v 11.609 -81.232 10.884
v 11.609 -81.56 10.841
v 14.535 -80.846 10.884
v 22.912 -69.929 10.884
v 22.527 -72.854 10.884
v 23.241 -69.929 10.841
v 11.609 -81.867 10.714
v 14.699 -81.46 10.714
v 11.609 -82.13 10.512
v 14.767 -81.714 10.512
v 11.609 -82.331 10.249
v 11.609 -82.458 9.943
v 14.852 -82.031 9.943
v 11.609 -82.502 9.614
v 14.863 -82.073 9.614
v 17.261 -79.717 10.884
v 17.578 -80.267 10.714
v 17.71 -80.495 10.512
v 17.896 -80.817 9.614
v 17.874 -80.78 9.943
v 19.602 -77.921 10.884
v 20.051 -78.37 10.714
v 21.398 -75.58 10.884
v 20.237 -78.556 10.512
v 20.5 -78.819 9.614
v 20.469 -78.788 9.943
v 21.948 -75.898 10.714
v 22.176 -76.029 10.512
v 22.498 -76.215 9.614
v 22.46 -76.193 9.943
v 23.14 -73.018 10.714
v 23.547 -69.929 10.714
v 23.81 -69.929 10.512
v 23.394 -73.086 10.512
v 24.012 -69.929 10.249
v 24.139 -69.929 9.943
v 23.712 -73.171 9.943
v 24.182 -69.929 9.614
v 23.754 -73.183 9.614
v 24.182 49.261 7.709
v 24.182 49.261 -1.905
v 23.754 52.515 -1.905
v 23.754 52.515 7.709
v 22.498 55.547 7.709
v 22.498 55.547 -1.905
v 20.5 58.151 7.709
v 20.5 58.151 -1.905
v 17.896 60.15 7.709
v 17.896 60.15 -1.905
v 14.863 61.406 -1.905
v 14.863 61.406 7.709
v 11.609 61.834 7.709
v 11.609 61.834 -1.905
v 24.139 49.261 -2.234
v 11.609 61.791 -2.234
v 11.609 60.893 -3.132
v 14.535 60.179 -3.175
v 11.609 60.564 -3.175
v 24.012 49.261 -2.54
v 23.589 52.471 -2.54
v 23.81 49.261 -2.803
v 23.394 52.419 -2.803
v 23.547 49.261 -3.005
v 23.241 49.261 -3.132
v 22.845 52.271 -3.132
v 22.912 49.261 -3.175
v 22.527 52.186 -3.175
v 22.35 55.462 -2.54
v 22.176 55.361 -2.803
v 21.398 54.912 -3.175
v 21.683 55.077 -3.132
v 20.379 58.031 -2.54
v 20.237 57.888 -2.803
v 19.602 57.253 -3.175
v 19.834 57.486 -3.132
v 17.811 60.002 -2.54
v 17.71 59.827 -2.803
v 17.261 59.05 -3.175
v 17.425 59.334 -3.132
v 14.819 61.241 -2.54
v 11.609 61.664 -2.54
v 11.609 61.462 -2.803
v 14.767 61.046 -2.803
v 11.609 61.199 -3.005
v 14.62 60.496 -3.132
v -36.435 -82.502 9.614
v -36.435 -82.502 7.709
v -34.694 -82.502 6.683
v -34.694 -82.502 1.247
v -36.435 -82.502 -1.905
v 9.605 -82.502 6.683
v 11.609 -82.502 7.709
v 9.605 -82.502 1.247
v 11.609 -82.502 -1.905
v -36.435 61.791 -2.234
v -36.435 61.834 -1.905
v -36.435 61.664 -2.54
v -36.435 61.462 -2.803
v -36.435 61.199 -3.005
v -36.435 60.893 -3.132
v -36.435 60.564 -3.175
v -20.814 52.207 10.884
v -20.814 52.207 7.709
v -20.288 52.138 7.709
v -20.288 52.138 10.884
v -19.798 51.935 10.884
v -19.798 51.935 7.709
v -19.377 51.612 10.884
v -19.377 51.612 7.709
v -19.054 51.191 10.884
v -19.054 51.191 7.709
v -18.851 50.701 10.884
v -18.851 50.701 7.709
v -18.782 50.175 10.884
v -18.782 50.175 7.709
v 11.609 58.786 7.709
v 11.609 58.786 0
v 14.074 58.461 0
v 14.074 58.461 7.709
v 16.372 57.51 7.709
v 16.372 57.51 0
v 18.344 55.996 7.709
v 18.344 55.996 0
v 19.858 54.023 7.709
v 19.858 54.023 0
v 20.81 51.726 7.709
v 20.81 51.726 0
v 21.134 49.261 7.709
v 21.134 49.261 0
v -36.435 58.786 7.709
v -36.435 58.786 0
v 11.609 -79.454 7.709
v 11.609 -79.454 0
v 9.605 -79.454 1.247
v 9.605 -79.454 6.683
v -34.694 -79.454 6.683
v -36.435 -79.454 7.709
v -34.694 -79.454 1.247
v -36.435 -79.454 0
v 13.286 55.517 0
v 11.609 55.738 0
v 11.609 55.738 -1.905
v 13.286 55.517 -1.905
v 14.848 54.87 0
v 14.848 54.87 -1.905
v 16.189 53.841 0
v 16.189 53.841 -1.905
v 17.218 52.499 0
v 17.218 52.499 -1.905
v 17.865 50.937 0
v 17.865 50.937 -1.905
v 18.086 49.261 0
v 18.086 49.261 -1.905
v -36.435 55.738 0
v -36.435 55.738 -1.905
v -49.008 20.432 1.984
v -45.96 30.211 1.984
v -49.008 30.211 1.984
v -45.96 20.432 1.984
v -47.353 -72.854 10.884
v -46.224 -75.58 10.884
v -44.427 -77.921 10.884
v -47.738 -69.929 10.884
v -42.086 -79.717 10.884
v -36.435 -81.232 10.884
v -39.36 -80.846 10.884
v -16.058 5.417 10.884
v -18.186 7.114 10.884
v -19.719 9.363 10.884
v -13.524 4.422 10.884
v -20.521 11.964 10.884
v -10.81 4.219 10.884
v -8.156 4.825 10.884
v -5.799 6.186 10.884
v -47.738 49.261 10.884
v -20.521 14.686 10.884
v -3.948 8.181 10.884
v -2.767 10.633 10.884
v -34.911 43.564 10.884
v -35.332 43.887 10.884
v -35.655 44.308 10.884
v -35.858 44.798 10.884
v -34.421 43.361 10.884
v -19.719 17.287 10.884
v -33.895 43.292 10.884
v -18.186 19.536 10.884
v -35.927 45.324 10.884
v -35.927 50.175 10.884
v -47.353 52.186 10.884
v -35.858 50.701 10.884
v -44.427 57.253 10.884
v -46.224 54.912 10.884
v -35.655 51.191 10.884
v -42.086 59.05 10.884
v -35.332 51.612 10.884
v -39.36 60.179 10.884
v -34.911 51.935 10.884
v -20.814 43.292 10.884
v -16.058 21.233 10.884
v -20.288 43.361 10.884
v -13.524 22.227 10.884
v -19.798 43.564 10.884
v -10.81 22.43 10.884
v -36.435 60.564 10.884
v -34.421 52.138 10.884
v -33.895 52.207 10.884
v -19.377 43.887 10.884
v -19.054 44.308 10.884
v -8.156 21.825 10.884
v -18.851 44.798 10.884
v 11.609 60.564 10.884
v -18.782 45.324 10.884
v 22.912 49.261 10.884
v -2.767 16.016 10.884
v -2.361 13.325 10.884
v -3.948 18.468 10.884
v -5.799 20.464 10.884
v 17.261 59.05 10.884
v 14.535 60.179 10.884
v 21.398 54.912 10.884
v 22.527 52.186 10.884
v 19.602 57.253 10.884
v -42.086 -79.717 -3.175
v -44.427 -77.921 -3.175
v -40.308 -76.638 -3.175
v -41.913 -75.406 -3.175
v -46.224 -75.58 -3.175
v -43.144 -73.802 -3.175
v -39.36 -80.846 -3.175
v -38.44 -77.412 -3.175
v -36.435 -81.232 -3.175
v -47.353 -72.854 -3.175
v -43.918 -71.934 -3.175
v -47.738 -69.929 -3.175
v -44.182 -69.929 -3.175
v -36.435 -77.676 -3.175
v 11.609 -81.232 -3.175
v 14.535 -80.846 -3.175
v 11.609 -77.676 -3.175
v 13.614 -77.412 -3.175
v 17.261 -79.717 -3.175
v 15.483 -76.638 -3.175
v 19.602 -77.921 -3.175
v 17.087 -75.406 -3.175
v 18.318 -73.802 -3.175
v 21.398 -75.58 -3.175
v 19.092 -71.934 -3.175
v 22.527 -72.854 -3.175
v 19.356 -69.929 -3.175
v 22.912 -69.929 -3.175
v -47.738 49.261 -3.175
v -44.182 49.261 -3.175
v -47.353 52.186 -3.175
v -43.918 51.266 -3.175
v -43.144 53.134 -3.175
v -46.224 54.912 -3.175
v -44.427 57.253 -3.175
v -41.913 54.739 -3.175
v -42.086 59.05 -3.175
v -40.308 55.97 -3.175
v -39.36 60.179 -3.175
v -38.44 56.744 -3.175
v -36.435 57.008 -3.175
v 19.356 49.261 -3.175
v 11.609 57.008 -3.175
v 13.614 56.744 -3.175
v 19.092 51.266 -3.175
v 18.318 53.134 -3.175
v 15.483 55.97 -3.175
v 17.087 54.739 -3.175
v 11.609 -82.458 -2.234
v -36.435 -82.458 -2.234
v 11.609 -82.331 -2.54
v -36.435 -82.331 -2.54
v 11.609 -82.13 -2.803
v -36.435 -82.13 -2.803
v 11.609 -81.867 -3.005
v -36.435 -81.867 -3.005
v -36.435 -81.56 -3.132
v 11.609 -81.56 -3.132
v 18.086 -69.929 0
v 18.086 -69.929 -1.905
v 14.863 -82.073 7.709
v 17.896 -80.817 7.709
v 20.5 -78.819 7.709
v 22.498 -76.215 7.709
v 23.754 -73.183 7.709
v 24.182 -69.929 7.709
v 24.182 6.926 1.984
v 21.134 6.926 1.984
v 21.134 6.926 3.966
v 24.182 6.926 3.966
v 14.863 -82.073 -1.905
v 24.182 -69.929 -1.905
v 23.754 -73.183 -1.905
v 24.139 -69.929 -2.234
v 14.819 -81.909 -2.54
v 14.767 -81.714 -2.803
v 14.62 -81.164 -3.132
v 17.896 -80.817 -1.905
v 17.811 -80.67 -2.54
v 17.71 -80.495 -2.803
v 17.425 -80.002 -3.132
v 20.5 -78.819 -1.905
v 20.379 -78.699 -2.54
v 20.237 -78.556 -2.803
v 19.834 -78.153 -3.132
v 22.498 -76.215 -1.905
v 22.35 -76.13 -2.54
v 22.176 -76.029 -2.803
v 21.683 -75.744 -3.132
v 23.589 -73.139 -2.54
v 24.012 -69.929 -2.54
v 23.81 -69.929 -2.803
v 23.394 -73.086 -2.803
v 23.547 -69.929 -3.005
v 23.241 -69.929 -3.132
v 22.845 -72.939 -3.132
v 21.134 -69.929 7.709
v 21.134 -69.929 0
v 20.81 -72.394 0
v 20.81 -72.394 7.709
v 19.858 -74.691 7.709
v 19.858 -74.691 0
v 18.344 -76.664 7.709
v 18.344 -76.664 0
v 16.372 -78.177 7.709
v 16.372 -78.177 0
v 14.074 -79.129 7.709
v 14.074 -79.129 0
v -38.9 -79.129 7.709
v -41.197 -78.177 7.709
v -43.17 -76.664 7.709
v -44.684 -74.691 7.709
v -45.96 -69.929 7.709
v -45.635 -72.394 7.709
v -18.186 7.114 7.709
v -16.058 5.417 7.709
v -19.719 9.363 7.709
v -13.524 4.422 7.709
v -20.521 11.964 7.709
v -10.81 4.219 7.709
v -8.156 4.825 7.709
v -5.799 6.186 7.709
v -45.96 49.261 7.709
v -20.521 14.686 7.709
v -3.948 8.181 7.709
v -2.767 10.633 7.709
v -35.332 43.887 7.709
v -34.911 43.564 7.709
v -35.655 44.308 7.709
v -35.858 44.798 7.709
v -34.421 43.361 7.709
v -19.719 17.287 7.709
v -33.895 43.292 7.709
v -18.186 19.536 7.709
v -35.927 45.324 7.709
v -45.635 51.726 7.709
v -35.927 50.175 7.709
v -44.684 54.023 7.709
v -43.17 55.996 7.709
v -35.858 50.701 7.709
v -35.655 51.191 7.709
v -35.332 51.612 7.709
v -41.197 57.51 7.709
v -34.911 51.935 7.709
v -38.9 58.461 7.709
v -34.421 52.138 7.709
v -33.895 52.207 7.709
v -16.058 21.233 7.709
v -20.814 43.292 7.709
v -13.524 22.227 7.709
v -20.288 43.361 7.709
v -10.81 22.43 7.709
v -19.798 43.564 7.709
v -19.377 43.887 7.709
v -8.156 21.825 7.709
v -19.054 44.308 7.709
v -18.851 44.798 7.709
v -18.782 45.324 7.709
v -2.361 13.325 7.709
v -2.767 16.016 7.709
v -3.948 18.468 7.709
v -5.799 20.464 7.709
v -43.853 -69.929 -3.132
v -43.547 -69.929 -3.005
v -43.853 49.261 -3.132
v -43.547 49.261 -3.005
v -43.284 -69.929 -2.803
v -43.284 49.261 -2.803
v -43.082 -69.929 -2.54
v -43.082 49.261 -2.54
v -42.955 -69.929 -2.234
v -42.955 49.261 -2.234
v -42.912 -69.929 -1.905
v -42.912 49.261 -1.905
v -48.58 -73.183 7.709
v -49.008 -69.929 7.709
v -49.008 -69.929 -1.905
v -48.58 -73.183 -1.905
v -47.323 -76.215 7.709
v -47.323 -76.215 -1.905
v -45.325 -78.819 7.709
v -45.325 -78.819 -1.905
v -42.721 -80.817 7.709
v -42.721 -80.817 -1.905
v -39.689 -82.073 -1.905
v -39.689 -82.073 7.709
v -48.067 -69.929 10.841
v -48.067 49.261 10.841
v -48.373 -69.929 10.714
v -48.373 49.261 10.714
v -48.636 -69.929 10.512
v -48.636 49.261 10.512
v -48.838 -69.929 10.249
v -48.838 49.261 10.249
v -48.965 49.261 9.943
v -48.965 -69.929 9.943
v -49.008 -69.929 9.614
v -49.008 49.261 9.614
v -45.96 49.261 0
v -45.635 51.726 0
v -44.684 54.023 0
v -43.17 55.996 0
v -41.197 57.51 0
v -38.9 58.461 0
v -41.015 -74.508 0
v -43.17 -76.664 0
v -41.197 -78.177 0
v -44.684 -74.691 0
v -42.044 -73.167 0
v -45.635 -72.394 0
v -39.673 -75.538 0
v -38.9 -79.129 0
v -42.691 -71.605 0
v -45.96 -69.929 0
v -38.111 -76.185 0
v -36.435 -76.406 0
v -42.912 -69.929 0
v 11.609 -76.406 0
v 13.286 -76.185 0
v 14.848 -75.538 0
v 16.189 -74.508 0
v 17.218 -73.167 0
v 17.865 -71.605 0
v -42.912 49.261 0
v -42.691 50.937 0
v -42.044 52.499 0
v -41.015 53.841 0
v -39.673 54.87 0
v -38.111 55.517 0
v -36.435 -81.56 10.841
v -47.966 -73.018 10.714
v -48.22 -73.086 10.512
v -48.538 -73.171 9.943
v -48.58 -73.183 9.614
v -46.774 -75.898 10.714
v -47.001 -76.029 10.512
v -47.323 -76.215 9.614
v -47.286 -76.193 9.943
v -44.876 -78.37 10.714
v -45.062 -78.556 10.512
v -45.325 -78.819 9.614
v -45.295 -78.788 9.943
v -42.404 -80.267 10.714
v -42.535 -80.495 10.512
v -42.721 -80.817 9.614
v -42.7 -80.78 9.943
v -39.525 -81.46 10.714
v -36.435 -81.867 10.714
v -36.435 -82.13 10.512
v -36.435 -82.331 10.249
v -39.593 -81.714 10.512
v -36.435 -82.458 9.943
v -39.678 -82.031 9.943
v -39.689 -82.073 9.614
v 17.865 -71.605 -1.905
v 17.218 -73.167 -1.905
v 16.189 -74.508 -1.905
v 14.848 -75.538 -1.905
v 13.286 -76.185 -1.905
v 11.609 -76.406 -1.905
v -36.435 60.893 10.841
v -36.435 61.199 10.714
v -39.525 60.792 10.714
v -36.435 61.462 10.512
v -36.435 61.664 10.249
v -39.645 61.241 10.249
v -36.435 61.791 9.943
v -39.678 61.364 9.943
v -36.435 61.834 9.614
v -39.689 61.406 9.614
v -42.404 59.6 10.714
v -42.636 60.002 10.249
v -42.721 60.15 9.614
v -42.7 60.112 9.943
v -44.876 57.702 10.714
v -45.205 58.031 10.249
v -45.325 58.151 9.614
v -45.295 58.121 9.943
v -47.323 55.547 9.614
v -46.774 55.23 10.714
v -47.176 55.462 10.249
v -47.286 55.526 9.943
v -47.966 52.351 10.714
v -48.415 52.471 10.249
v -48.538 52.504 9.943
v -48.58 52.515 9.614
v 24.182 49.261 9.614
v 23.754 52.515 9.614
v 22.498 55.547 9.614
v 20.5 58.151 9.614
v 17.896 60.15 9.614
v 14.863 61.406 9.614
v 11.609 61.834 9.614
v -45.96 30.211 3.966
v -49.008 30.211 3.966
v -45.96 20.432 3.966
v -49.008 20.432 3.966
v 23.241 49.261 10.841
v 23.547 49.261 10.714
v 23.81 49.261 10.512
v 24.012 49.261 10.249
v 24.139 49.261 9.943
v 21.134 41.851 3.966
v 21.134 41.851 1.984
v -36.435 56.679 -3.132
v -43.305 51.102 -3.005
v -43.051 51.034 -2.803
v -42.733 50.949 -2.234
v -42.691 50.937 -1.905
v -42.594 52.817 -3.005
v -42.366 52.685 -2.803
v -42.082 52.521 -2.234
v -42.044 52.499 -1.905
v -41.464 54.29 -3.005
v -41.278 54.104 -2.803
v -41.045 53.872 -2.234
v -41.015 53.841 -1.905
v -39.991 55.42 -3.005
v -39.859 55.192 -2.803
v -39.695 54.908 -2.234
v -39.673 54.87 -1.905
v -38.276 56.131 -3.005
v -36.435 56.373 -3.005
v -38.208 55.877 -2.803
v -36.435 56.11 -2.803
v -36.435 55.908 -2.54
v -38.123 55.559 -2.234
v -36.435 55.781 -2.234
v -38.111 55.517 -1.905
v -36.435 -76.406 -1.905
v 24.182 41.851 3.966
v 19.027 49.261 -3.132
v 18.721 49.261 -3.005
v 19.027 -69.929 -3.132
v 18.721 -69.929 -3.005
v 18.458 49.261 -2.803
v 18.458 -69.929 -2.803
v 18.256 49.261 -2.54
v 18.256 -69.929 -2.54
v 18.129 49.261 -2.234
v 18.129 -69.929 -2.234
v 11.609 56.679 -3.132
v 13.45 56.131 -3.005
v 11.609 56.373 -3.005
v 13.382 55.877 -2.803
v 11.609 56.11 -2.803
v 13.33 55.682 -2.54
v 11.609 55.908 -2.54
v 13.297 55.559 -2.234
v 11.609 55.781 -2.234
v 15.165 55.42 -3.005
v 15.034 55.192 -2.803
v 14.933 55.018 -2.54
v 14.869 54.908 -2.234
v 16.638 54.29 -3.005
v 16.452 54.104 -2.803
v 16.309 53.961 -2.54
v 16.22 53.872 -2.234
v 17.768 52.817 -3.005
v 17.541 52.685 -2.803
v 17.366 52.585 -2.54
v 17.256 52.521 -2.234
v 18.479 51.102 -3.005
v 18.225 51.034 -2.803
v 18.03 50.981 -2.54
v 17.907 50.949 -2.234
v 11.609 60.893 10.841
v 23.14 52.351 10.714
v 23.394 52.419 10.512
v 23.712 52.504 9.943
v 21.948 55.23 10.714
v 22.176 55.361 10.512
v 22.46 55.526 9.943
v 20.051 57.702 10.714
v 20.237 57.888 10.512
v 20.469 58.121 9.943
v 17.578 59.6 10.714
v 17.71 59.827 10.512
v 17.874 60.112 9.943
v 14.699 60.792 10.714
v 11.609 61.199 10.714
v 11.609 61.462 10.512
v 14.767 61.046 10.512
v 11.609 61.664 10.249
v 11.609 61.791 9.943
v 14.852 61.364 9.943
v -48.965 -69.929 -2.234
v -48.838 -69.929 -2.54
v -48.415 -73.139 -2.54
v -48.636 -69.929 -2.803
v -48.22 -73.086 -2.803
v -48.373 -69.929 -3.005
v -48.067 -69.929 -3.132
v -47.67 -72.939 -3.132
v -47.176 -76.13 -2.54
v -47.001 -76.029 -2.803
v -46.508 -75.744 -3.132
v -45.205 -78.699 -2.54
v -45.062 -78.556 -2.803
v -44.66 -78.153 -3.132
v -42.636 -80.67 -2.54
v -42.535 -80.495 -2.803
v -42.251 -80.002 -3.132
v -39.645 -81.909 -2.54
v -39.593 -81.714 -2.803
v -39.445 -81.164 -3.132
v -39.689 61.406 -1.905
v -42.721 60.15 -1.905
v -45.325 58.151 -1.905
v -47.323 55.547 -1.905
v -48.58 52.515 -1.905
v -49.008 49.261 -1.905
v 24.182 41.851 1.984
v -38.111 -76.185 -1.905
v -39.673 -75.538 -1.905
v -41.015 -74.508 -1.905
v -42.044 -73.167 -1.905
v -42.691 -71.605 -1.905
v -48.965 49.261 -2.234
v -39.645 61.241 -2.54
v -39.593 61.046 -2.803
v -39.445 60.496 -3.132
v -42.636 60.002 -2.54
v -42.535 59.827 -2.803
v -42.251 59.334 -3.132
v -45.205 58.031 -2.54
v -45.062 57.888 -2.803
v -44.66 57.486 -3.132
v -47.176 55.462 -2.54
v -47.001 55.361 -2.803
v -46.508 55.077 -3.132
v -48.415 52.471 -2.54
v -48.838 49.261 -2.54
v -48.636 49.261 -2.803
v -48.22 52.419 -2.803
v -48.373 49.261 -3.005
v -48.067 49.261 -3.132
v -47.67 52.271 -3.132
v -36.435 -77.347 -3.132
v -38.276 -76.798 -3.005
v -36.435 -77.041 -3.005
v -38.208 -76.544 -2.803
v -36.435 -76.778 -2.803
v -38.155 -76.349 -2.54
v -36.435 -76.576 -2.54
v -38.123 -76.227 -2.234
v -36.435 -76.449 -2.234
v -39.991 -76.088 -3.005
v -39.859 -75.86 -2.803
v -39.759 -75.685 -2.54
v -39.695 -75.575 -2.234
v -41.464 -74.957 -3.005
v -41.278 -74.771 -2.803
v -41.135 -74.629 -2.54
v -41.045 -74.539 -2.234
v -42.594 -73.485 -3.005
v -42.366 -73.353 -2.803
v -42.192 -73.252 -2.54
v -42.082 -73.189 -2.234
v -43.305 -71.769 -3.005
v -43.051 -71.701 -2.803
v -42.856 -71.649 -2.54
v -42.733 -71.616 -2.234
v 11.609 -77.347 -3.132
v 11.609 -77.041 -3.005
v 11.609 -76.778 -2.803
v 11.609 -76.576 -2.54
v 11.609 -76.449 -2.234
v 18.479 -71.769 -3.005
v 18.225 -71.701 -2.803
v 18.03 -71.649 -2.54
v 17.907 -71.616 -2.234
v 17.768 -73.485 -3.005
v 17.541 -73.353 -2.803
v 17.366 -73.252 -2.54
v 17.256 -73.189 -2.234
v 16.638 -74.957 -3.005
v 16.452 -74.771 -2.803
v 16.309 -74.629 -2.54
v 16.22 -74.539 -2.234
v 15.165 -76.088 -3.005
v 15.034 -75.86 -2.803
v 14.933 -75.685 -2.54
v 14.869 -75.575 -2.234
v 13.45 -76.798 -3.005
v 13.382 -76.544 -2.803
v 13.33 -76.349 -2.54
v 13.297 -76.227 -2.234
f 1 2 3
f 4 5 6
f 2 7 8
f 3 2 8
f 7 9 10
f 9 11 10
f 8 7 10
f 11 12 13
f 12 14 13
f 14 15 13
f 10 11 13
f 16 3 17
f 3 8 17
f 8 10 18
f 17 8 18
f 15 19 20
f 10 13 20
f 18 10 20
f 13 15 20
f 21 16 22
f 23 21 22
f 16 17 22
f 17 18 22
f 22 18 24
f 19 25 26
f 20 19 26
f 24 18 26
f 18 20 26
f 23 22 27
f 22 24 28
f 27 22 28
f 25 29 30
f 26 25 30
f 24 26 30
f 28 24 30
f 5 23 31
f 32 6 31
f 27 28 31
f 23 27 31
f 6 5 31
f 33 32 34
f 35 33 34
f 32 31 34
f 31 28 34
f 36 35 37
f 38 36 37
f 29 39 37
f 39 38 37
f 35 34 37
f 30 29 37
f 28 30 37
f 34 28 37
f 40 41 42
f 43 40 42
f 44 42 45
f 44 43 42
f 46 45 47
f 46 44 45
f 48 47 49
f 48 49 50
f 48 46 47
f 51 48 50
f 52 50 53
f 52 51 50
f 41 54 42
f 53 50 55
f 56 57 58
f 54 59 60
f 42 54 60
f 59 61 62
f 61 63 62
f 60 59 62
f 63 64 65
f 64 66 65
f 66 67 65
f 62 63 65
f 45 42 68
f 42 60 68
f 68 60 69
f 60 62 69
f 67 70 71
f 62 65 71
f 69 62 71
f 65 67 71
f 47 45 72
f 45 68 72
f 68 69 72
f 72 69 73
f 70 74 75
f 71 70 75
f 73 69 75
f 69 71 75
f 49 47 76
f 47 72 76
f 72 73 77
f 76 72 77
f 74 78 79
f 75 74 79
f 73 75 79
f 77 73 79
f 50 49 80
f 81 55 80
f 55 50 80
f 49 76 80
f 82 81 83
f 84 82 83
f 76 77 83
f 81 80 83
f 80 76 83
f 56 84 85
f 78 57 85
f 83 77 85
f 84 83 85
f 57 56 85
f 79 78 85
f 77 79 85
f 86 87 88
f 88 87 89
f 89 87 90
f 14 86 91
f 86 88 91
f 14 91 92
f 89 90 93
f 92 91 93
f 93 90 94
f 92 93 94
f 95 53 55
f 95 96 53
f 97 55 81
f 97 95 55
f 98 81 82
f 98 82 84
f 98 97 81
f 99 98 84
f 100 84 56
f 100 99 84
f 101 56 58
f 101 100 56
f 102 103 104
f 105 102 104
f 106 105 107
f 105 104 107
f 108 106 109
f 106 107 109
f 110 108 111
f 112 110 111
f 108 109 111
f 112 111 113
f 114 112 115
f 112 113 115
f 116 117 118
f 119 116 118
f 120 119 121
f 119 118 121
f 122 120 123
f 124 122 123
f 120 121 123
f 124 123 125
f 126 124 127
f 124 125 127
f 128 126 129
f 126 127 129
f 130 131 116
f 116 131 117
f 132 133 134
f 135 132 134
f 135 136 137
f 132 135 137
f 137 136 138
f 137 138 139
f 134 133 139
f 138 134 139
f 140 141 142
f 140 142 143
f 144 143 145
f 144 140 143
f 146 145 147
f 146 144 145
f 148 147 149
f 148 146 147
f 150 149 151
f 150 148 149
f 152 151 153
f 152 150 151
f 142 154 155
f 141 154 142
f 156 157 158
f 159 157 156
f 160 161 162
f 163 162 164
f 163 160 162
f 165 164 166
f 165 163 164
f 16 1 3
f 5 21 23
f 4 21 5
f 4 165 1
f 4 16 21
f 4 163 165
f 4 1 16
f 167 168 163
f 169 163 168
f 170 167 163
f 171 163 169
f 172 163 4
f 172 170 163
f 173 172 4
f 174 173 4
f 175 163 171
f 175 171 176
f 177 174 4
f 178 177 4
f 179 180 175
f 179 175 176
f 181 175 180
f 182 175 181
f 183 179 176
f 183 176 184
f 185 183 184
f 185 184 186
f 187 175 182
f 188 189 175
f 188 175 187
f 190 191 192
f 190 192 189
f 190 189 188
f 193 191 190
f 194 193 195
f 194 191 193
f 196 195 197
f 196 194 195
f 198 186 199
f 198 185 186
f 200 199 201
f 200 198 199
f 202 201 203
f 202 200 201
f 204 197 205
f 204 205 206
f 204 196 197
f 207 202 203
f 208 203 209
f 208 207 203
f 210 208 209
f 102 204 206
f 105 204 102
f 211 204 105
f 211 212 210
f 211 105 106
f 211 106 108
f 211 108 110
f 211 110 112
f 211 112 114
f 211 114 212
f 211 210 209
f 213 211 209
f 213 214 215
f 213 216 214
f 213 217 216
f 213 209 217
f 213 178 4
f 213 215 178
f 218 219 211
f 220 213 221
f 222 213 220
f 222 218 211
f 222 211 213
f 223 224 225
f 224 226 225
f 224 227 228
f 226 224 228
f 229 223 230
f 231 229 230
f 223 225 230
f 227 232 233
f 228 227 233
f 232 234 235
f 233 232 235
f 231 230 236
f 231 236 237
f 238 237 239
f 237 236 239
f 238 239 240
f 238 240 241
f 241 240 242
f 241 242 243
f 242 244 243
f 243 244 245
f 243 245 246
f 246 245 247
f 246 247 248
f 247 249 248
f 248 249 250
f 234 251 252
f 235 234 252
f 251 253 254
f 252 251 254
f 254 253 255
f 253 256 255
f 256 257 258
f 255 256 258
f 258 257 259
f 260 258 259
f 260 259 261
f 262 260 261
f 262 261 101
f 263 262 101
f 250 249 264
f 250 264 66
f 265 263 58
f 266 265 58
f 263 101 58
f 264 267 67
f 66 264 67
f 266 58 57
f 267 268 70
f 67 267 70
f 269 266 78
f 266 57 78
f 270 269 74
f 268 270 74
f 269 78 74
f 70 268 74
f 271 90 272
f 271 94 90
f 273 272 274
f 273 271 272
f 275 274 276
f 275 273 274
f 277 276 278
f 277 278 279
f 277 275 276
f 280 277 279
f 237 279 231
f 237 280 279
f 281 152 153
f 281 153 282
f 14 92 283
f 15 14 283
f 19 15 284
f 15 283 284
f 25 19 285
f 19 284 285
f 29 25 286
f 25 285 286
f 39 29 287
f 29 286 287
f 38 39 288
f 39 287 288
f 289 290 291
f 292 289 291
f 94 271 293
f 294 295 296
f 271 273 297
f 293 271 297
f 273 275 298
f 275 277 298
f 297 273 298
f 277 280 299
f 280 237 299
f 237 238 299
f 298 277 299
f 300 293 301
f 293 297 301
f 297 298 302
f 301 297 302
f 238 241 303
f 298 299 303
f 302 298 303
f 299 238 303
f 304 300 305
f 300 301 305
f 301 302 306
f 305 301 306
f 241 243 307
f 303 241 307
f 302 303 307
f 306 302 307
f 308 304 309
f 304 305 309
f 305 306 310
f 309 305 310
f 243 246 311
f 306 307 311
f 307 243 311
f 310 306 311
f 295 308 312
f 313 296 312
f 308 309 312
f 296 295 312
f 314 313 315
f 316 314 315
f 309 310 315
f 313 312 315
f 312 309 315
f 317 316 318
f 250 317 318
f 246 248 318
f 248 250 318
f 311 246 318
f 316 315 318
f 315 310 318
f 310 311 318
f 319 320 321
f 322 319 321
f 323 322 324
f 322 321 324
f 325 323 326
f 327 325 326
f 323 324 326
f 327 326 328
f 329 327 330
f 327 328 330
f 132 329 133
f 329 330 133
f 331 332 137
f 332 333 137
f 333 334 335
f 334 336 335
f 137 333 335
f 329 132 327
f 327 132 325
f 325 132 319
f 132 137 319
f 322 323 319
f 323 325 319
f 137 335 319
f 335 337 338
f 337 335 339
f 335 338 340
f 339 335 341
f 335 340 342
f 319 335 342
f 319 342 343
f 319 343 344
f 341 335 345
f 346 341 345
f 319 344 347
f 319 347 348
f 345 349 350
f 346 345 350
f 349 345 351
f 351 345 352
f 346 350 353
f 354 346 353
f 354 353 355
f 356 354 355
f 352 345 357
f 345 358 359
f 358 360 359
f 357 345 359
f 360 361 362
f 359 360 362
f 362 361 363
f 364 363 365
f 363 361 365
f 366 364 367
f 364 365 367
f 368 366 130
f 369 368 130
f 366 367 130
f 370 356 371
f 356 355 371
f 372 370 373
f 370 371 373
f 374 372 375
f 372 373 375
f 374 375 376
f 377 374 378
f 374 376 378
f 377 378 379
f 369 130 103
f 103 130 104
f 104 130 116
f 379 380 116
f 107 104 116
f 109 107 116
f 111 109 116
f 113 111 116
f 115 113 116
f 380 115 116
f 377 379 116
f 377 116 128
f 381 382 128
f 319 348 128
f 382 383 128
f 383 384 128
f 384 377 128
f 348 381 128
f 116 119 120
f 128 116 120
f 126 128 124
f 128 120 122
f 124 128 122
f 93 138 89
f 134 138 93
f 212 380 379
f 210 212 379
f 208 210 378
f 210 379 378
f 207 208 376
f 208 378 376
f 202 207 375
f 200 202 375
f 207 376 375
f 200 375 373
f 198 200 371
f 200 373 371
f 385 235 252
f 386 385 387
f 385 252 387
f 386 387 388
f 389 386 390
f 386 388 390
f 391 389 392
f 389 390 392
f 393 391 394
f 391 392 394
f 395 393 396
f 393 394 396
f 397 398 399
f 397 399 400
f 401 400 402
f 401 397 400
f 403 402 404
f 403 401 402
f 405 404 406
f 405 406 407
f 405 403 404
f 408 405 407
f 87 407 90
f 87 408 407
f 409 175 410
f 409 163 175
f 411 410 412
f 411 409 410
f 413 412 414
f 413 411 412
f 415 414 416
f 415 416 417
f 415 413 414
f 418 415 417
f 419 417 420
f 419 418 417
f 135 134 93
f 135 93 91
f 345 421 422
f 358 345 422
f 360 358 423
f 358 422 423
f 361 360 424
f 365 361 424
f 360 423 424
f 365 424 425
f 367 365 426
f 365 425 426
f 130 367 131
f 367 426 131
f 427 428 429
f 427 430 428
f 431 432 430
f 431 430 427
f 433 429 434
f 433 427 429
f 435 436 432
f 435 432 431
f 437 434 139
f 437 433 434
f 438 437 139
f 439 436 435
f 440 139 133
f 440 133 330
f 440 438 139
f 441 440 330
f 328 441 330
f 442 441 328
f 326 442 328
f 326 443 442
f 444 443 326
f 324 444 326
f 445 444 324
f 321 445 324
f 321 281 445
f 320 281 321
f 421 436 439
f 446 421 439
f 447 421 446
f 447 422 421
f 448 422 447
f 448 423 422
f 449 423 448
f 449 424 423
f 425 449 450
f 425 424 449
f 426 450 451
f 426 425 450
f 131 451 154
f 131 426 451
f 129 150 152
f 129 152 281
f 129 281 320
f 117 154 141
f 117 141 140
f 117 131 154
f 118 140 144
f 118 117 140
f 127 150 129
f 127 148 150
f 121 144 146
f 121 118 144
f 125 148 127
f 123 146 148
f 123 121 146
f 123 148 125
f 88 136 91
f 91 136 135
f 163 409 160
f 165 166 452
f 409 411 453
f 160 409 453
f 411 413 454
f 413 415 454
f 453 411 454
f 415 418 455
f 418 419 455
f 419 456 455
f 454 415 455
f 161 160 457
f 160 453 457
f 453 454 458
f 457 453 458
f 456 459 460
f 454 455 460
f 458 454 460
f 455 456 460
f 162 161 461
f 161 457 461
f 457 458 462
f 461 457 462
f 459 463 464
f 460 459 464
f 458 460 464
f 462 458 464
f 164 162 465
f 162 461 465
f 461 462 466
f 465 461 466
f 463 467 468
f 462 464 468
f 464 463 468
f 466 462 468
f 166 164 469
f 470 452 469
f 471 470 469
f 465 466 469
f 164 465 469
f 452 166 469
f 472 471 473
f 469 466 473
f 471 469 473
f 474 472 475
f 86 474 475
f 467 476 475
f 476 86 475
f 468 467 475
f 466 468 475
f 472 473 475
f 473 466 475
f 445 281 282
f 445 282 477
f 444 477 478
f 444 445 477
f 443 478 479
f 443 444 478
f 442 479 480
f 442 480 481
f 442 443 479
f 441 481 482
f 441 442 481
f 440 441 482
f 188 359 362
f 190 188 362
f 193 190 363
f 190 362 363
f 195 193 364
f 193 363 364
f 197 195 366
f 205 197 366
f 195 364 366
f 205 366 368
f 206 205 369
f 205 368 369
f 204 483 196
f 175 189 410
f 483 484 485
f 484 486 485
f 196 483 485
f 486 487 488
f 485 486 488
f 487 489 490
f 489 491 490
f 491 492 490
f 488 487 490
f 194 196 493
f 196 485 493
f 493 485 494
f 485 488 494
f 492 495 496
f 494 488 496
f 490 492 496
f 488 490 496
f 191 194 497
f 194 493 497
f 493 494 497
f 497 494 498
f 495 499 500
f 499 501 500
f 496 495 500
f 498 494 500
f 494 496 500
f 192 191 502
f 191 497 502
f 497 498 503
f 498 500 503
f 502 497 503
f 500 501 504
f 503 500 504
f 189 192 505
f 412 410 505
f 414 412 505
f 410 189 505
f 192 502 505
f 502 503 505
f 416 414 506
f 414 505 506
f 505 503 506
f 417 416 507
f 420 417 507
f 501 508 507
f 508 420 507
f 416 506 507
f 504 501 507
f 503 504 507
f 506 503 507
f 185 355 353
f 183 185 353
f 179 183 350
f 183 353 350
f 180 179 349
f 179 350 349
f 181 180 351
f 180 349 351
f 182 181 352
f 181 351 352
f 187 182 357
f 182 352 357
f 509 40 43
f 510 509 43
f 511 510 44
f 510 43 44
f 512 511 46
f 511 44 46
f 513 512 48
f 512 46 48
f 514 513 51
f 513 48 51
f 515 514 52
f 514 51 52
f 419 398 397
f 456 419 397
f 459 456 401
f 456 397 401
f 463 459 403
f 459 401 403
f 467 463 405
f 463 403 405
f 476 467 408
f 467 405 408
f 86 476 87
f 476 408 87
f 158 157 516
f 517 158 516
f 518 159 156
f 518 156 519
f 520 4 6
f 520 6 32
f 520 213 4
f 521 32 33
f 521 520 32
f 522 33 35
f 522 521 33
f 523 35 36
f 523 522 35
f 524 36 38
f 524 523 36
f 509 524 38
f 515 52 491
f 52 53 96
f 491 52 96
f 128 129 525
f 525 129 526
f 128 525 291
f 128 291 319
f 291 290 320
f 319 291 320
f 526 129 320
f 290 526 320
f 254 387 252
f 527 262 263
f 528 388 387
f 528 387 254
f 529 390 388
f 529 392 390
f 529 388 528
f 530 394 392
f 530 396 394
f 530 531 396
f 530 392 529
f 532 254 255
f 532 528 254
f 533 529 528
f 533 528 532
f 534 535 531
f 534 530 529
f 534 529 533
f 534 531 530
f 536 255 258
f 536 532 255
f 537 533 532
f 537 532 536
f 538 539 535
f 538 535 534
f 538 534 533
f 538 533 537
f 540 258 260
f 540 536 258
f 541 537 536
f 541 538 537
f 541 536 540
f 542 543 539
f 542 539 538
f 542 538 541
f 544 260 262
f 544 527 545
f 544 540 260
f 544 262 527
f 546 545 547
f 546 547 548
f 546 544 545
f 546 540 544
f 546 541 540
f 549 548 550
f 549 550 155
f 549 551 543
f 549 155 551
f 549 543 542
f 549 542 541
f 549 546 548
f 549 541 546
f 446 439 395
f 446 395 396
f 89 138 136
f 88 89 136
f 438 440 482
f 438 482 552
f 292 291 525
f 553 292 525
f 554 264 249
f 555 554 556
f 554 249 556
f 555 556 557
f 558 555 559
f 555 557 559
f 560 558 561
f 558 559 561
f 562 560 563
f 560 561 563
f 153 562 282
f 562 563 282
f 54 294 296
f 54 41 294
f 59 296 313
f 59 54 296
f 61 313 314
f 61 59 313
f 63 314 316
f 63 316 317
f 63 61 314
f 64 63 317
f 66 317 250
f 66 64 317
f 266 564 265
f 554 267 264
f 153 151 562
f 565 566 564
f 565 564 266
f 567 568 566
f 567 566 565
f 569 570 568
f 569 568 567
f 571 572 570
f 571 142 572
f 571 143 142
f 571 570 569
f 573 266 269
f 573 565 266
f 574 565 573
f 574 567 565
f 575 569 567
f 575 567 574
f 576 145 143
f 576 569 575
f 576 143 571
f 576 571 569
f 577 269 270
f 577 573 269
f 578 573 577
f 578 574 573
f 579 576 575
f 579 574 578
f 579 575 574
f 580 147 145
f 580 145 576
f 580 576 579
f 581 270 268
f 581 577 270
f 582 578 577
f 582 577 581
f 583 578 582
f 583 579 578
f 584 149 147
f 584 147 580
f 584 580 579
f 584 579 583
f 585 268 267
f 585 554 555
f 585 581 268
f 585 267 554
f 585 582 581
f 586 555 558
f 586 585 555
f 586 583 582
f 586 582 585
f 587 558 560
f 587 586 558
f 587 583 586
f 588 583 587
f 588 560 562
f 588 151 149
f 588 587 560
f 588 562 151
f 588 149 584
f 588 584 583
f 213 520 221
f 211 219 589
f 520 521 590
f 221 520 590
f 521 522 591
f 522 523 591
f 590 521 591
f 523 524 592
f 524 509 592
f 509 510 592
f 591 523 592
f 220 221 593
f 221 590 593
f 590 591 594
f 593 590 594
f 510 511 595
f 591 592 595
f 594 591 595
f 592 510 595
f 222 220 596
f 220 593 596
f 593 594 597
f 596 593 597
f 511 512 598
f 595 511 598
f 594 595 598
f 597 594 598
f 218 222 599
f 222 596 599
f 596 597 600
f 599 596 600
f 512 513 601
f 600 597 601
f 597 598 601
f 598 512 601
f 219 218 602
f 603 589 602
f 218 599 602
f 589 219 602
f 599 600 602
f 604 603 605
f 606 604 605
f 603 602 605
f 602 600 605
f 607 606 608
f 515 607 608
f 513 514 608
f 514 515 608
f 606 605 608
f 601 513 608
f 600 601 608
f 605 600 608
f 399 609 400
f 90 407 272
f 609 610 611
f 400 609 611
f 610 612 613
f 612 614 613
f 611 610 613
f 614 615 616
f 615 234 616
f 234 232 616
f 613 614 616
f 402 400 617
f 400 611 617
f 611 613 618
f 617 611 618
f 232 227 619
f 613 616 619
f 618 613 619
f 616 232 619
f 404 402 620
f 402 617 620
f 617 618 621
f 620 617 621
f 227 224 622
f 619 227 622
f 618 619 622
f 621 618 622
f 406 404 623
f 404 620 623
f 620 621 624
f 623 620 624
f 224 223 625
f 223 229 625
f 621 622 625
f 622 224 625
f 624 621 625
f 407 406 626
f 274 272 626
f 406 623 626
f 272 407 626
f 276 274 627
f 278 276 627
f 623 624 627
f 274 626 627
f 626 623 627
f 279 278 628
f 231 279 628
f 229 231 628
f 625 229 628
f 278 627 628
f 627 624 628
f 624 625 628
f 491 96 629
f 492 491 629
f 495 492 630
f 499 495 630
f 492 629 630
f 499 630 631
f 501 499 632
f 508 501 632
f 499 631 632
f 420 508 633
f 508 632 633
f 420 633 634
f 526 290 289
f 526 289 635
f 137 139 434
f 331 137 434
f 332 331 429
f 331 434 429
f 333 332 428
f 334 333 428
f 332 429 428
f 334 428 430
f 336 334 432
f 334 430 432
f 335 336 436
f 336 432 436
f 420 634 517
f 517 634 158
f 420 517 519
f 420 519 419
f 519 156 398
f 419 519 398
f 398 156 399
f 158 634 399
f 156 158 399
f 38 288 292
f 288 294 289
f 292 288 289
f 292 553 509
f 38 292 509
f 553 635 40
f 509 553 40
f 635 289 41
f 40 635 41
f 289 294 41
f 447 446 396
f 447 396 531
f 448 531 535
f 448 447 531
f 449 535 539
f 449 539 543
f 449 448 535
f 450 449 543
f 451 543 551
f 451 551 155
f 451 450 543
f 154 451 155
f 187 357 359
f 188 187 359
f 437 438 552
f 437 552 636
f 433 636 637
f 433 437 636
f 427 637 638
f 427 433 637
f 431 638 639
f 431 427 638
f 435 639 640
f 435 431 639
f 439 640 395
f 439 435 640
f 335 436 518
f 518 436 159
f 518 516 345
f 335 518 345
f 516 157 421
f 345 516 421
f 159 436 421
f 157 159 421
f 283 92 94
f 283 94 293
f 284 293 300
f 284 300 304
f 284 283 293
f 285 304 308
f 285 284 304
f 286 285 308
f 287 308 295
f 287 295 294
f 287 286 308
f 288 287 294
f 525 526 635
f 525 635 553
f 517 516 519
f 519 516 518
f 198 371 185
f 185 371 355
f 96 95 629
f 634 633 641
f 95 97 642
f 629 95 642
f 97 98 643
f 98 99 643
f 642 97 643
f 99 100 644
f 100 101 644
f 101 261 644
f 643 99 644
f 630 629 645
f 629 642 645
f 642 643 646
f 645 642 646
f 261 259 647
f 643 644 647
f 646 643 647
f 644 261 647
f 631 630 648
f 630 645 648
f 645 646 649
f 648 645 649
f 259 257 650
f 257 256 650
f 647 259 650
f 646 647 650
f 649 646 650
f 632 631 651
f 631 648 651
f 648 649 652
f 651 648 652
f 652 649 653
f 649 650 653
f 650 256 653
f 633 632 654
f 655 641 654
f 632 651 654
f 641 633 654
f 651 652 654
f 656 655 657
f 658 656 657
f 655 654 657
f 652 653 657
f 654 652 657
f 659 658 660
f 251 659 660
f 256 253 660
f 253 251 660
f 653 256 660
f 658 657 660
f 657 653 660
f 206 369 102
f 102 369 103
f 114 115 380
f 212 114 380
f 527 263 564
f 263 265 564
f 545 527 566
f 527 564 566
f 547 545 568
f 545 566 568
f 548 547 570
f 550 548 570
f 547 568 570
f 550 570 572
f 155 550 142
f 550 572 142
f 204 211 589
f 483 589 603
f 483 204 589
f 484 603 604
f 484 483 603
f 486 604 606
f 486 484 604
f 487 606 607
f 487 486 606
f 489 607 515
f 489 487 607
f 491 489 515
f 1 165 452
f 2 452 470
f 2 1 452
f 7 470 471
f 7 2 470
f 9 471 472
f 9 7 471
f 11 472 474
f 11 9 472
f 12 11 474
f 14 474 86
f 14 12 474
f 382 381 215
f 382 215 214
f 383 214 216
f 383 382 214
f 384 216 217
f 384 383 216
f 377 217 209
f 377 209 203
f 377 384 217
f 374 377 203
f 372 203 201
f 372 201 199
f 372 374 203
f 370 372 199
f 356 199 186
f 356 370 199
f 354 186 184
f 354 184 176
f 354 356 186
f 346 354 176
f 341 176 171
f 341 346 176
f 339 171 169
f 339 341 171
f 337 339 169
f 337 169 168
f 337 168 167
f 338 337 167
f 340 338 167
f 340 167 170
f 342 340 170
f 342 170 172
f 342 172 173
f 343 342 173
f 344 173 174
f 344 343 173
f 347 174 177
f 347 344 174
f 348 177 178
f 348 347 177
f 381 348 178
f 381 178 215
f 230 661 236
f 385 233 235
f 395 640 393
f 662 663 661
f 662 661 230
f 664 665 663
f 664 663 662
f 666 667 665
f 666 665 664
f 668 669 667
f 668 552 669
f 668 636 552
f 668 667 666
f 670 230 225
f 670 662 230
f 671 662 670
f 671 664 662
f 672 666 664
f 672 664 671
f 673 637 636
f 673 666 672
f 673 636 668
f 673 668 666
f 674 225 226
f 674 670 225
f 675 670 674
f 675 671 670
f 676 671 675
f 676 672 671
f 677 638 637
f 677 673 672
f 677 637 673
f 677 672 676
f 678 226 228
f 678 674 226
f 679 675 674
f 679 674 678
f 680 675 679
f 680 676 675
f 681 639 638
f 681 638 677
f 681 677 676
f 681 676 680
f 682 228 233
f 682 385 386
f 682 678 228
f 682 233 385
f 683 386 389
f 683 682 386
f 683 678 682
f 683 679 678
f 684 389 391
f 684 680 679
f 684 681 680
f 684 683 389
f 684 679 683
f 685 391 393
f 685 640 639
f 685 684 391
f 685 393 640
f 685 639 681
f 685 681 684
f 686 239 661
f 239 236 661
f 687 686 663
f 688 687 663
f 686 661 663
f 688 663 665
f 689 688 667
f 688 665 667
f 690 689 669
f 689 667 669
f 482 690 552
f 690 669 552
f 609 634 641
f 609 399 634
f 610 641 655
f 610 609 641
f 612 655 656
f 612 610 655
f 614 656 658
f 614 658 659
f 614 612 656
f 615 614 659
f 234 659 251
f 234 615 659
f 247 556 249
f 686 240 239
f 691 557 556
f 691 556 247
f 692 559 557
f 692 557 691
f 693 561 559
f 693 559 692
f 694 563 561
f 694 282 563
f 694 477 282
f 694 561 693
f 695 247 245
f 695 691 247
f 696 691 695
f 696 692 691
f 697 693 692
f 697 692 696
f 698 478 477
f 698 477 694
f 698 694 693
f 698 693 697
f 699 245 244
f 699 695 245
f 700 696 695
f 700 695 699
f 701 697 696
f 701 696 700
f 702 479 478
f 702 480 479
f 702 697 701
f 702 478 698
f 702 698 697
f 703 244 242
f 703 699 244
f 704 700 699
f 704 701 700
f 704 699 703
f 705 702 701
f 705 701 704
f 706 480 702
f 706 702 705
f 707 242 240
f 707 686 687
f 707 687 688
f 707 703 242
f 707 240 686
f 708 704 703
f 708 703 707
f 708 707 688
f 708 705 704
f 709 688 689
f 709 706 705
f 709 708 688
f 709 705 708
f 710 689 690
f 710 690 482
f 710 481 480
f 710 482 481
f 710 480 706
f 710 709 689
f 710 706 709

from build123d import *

# Parameters (mm, degrees)
F0_R       = 9.1313
F1_DEPTH   = 7.7089
F2_W       = 9.779
F2_H       = 1.9812
F3_DEPTH   = 9.144
F4_W       = 44.2985175177
F4_H       = 5.4359880742
F5_DEPTH   = 17.018
F6_W       = 34.925
F6_H       = 1.9812
F7_DEPTH   = 68.834
F8_DEPTH   = 7.7089
F9_DEPTH   = 32.004
F10_DEPTH  = 3.175
F1_FACE2_R = 9.1313
F11_DEPTH  = 3.175
F13_R      = 1.27


with BuildPart() as f1:
    # F0 (on Top) → F1 (new body)
    with BuildSketch(Plane.XY):
        with BuildLine():
            Line((11.6091579572, 58.7859712541), (-36.4349420428, 58.7859712541))
            ThreePointArc((-36.4349420428, 58.7859712541), (-43.1701341336, 55.9961633449), (-45.9599420428, 49.2609712541))
            Line((-45.9599420428, 49.2609712541), (-45.9599420428, -69.9285287459))
            ThreePointArc((-45.9599420428, -69.9285287459), (-43.1701341336, -76.6637208367), (-36.4349420428, -79.4535287459))
            Line((-36.4349420428, -79.4535287459), (11.6091579572, -79.4535287459))
            ThreePointArc((11.6091579572, -79.4535287459), (18.344350048, -76.6637208367), (21.1341579572, -69.9285287459))
            Line((21.1341579572, -69.9285287459), (21.1341579572, 29.7156712541))
            Line((21.1341579572, 29.7156712541), (21.1341579572, 49.2609712541))
            ThreePointArc((21.1341579572, 49.2609712541), (18.344350048, 55.9961633449), (11.6091579572, 58.7859712541))
        make_face()
        with BuildLine():
            ThreePointArc((-42.9119420428, 49.2609712541), (-41.0148726646, 53.8409018759), (-36.4349420428, 55.7379712541))
            Line((-36.4349420428, 55.7379712541), (11.6091579572, 55.7379712541))
            ThreePointArc((11.6091579572, 55.7379712541), (16.1890885789, 53.8409018759), (18.0861579572, 49.2609712541))
            Line((18.0861579572, 49.2609712541), (18.0861579572, -69.9285287459))
            ThreePointArc((18.0861579572, -69.9285287459), (16.1890885789, -74.5084593676), (11.6091579572, -76.4055287459))
            Line((11.6091579572, -76.4055287459), (-36.4349420428, -76.4055287459))
            ThreePointArc((-36.4349420428, -76.4055287459), (-41.0148726646, -74.5084593676), (-42.9119420428, -69.9285287459))
            Line((-42.9119420428, -69.9285287459), (-42.9119420428, 49.2609712541))
        make_face(mode=Mode.SUBTRACT)
        with BuildLine():
            Line((11.6091579572, 55.7379712541), (-36.4349420428, 55.7379712541))
            ThreePointArc((-36.4349420428, 55.7379712541), (-41.0148726646, 53.8409018759), (-42.9119420428, 49.2609712541))
            Line((-42.9119420428, 49.2609712541), (-42.9119420428, -69.9285287459))
            ThreePointArc((-42.9119420428, -69.9285287459), (-41.0148726646, -74.5084593676), (-36.4349420428, -76.4055287459))
            Line((-36.4349420428, -76.4055287459), (11.6091579572, -76.4055287459))
            ThreePointArc((11.6091579572, -76.4055287459), (16.1890885789, -74.5084593676), (18.0861579572, -69.9285287459))
            Line((18.0861579572, -69.9285287459), (18.0861579572, 49.2609712541))
            ThreePointArc((18.0861579572, 49.2609712541), (16.1890885789, 53.8409018759), (11.6091579572, 55.7379712541))
        make_face()
        with BuildLine():
            Line((-35.9269420428, 45.3239712541), (-35.9269420428, 50.1753712541))
            ThreePointArc((-35.9269420428, 50.1753712541), (-35.3317830222, 51.6122122335), (-33.8949420428, 52.2073712541))
            Line((-33.8949420428, 52.2073712541), (-20.8139420428, 52.2073712541))
            ThreePointArc((-20.8139420428, 52.2073712541), (-19.3771010635, 51.6122122335), (-18.7819420428, 50.1753712541))
            Line((-18.7819420428, 50.1753712541), (-18.7819420428, 45.3239712541))
            ThreePointArc((-18.7819420428, 45.3239712541), (-19.3771010635, 43.8871302747), (-20.8139420428, 43.2919712541))
            Line((-20.8139420428, 43.2919712541), (-33.8949420428, 43.2919712541))
            ThreePointArc((-33.8949420428, 43.2919712541), (-35.3317830222, 43.8871302747), (-35.9269420428, 45.3239712541))
        make_face(mode=Mode.SUBTRACT)
        with Locations((-11.4921420428, 13.3246481419)):
            Circle(F0_R, mode=Mode.SUBTRACT)
    extrude(amount=F1_DEPTH)

    # F4 (on face) → F5 (join)
    with BuildSketch(Plane.XZ.offset(79.4535287459)):
        with Locations((-12.5446827151, 3.9651609259)):
            Rectangle(F4_W, F4_H)
    extrude(amount=F5_DEPTH)

    # F0 (on Top) → F9 (join)
    with BuildSketch(Plane.XY):
        with BuildLine():
            Line((11.6091579572, 55.7379712541), (-36.4349420428, 55.7379712541))
            ThreePointArc((-36.4349420428, 55.7379712541), (-41.0148726646, 53.8409018759), (-42.9119420428, 49.2609712541))
            Line((-42.9119420428, 49.2609712541), (-42.9119420428, -69.9285287459))
            ThreePointArc((-42.9119420428, -69.9285287459), (-41.0148726646, -74.5084593676), (-36.4349420428, -76.4055287459))
            Line((-36.4349420428, -76.4055287459), (11.6091579572, -76.4055287459))
            ThreePointArc((11.6091579572, -76.4055287459), (16.1890885789, -74.5084593676), (18.0861579572, -69.9285287459))
            Line((18.0861579572, -69.9285287459), (18.0861579572, 49.2609712541))
            ThreePointArc((18.0861579572, 49.2609712541), (16.1890885789, 53.8409018759), (11.6091579572, 55.7379712541))
        make_face()
        with BuildLine():
            Line((-35.9269420428, 45.3239712541), (-35.9269420428, 50.1753712541))
            ThreePointArc((-35.9269420428, 50.1753712541), (-35.3317830222, 51.6122122335), (-33.8949420428, 52.2073712541))
            Line((-33.8949420428, 52.2073712541), (-20.8139420428, 52.2073712541))
            ThreePointArc((-20.8139420428, 52.2073712541), (-19.3771010635, 51.6122122335), (-18.7819420428, 50.1753712541))
            Line((-18.7819420428, 50.1753712541), (-18.7819420428, 45.3239712541))
            ThreePointArc((-18.7819420428, 45.3239712541), (-19.3771010635, 43.8871302747), (-20.8139420428, 43.2919712541))
            Line((-20.8139420428, 43.2919712541), (-33.8949420428, 43.2919712541))
            ThreePointArc((-33.8949420428, 43.2919712541), (-35.3317830222, 43.8871302747), (-35.9269420428, 45.3239712541))
        make_face(mode=Mode.SUBTRACT)
        with Locations((-11.4921420428, 13.3246481419)):
            Circle(F0_R, mode=Mode.SUBTRACT)
    extrude(amount=-F9_DEPTH)


with BuildPart() as f3:
    # F2 (on face) → F3 (new body)
    with BuildSketch(Plane(origin=(-45.9599420428, 0, 0), x_dir=(0, -1, 0), z_dir=(-1, 0, 0))):
        with Locations((-25.3214712541, 2.974975)):
            Rectangle(F2_W, F2_H)
    extrude(amount=F3_DEPTH)


with BuildPart() as f7:
    # F6 (on Right) → F7 (new body)
    with BuildSketch(Plane.YZ):
        with Locations((24.3882495925, 2.974975)):
            Rectangle(F6_W, F6_H)
    extrude(amount=F7_DEPTH)


with BuildPart() as f8:
    # F0 (on Top) → F8 (new body, through all)
    with BuildSketch(Plane.XY):
        with BuildLine():
            Line((24.1821579572, -69.9285287459), (24.1821579572, 49.2609712541))
            ThreePointArc((24.1821579572, 49.2609712541), (20.499611517, 58.151424814), (11.6091579572, 61.8339712541))
            Line((11.6091579572, 61.8339712541), (-36.4349420428, 61.8339712541))
            ThreePointArc((-36.4349420428, 61.8339712541), (-45.3253956027, 58.151424814), (-49.0079420428, 49.2609712541))
            Line((-49.0079420428, 49.2609712541), (-49.0079420428, -69.9285287459))
            ThreePointArc((-49.0079420428, -69.9285287459), (-45.3253956027, -78.8189823057), (-36.4349420428, -82.5015287459))
            Line((-36.4349420428, -82.5015287459), (11.6091579572, -82.5015287459))
            ThreePointArc((11.6091579572, -82.5015287459), (20.499611517, -78.8189823057), (24.1821579572, -69.9285287459))
        make_face()
        with BuildLine():
            ThreePointArc((-45.9599420428, 49.2609712541), (-43.1701341336, 55.9961633449), (-36.4349420428, 58.7859712541))
            Line((-36.4349420428, 58.7859712541), (11.6091579572, 58.7859712541))
            ThreePointArc((11.6091579572, 58.7859712541), (18.344350048, 55.9961633449), (21.1341579572, 49.2609712541))
            Line((21.1341579572, 49.2609712541), (21.1341579572, 29.7156712541))
            Line((21.1341579572, 29.7156712541), (21.1341579572, -69.9285287459))
            ThreePointArc((21.1341579572, -69.9285287459), (18.344350048, -76.6637208367), (11.6091579572, -79.4535287459))
            Line((11.6091579572, -79.4535287459), (-36.4349420428, -79.4535287459))
            ThreePointArc((-36.4349420428, -79.4535287459), (-43.1701341336, -76.6637208367), (-45.9599420428, -69.9285287459))
            Line((-45.9599420428, -69.9285287459), (-45.9599420428, 49.2609712541))
        make_face(mode=Mode.SUBTRACT)
    extrude(amount=F8_DEPTH)

    # F0 (on Top) → F10 (join)
    with BuildSketch(Plane.XY):
        with BuildLine():
            Line((24.1821579572, -69.9285287459), (24.1821579572, 49.2609712541))
            ThreePointArc((24.1821579572, 49.2609712541), (20.499611517, 58.151424814), (11.6091579572, 61.8339712541))
            Line((11.6091579572, 61.8339712541), (-36.4349420428, 61.8339712541))
            ThreePointArc((-36.4349420428, 61.8339712541), (-45.3253956027, 58.151424814), (-49.0079420428, 49.2609712541))
            Line((-49.0079420428, 49.2609712541), (-49.0079420428, -69.9285287459))
            ThreePointArc((-49.0079420428, -69.9285287459), (-45.3253956027, -78.8189823057), (-36.4349420428, -82.5015287459))
            Line((-36.4349420428, -82.5015287459), (11.6091579572, -82.5015287459))
            ThreePointArc((11.6091579572, -82.5015287459), (20.499611517, -78.8189823057), (24.1821579572, -69.9285287459))
        make_face()
        with BuildLine():
            ThreePointArc((-45.9599420428, 49.2609712541), (-43.1701341336, 55.9961633449), (-36.4349420428, 58.7859712541))
            Line((-36.4349420428, 58.7859712541), (11.6091579572, 58.7859712541))
            ThreePointArc((11.6091579572, 58.7859712541), (18.344350048, 55.9961633449), (21.1341579572, 49.2609712541))
            Line((21.1341579572, 49.2609712541), (21.1341579572, 29.7156712541))
            Line((21.1341579572, 29.7156712541), (21.1341579572, -69.9285287459))
            ThreePointArc((21.1341579572, -69.9285287459), (18.344350048, -76.6637208367), (11.6091579572, -79.4535287459))
            Line((11.6091579572, -79.4535287459), (-36.4349420428, -79.4535287459))
            ThreePointArc((-36.4349420428, -79.4535287459), (-43.1701341336, -76.6637208367), (-45.9599420428, -69.9285287459))
            Line((-45.9599420428, -69.9285287459), (-45.9599420428, 49.2609712541))
        make_face(mode=Mode.SUBTRACT)
        with BuildLine():
            Line((11.6091579572, 58.7859712541), (-36.4349420428, 58.7859712541))
            ThreePointArc((-36.4349420428, 58.7859712541), (-43.1701341336, 55.9961633449), (-45.9599420428, 49.2609712541))
            Line((-45.9599420428, 49.2609712541), (-45.9599420428, -69.9285287459))
            ThreePointArc((-45.9599420428, -69.9285287459), (-43.1701341336, -76.6637208367), (-36.4349420428, -79.4535287459))
            Line((-36.4349420428, -79.4535287459), (11.6091579572, -79.4535287459))
            ThreePointArc((11.6091579572, -79.4535287459), (18.344350048, -76.6637208367), (21.1341579572, -69.9285287459))
            Line((21.1341579572, -69.9285287459), (21.1341579572, 29.7156712541))
            Line((21.1341579572, 29.7156712541), (21.1341579572, 49.2609712541))
            ThreePointArc((21.1341579572, 49.2609712541), (18.344350048, 55.9961633449), (11.6091579572, 58.7859712541))
        make_face()
        with BuildLine():
            ThreePointArc((-42.9119420428, 49.2609712541), (-41.0148726646, 53.8409018759), (-36.4349420428, 55.7379712541))
            Line((-36.4349420428, 55.7379712541), (11.6091579572, 55.7379712541))
            ThreePointArc((11.6091579572, 55.7379712541), (16.1890885789, 53.8409018759), (18.0861579572, 49.2609712541))
            Line((18.0861579572, 49.2609712541), (18.0861579572, -69.9285287459))
            ThreePointArc((18.0861579572, -69.9285287459), (16.1890885789, -74.5084593676), (11.6091579572, -76.4055287459))
            Line((11.6091579572, -76.4055287459), (-36.4349420428, -76.4055287459))
            ThreePointArc((-36.4349420428, -76.4055287459), (-41.0148726646, -74.5084593676), (-42.9119420428, -69.9285287459))
            Line((-42.9119420428, -69.9285287459), (-42.9119420428, 49.2609712541))
        make_face(mode=Mode.SUBTRACT)
    extrude(amount=-F10_DEPTH)

    # F1_face2 (on face) + F8_face (on face) → F11 (join)
    with BuildSketch(Plane(origin=(-12.1864232074, -12.0262288376, 7.7089), x_dir=(1, 0, 0), z_dir=(0, 0, 1))):
        with BuildLine():
            Line((23.7955811646, 70.8122000917), (-24.2485188354, 70.8122000917))
            ThreePointArc((-24.2485188354, 70.8122000917), (-30.9837109262, 68.0223921825), (-33.7735188354, 61.2872000917))
            Line((-33.7735188354, 61.2872000917), (-33.7735188354, -57.9022999083))
            ThreePointArc((-33.7735188354, -57.9022999083), (-30.9837109262, -64.6374919991), (-24.2485188354, -67.4272999083))
            Line((-24.2485188354, -67.4272999083), (23.7955811646, -67.4272999083))
            ThreePointArc((23.7955811646, -67.4272999083), (30.5307732554, -64.6374919991), (33.3205811646, -57.9022999083))
            Line((33.3205811646, -57.9022999083), (33.3205811646, 61.2872000917))
            ThreePointArc((33.3205811646, 61.2872000917), (30.5307732554, 68.0223921825), (23.7955811646, 70.8122000917))
        make_face()
        with BuildLine():
            Line((-8.6275188354, 55.3182000917), (-21.7085188354, 55.3182000917))
            ThreePointArc((-21.7085188354, 55.3182000917), (-23.1453598148, 55.9133591123), (-23.7405188354, 57.3502000917))
            Line((-23.7405188354, 57.3502000917), (-23.7405188354, 62.2016000917))
            ThreePointArc((-23.7405188354, 62.2016000917), (-23.1453598148, 63.6384410711), (-21.7085188354, 64.2336000917))
            Line((-21.7085188354, 64.2336000917), (-8.6275188354, 64.2336000917))
            ThreePointArc((-8.6275188354, 64.2336000917), (-7.1906778561, 63.6384410711), (-6.5955188354, 62.2016000917))
            Line((-6.5955188354, 62.2016000917), (-6.5955188354, 57.3502000917))
            ThreePointArc((-6.5955188354, 57.3502000917), (-7.1906778561, 55.9133591123), (-8.6275188354, 55.3182000917))
        make_face(mode=Mode.SUBTRACT)
        with Locations((0.6942811646, 25.3508769795)):
            Circle(F1_FACE2_R, mode=Mode.SUBTRACT)
    with BuildSketch(Plane(origin=(-12.4128920428, -10.3337787459, 7.7089), x_dir=(1, 0, 0), z_dir=(0, 0, 1))):
        with BuildLine():
            Line((36.59505, -59.59475), (36.59505, 59.59475))
            ThreePointArc((36.59505, 59.59475), (32.9125035599, 68.4852035599), (24.02205, 72.16775))
            Line((24.02205, 72.16775), (-24.02205, 72.16775))
            ThreePointArc((-24.02205, 72.16775), (-32.9125035599, 68.4852035599), (-36.59505, 59.59475))
            Line((-36.59505, 59.59475), (-36.59505, -59.59475))
            ThreePointArc((-36.59505, -59.59475), (-32.9125035599, -68.4852035599), (-24.02205, -72.16775))
            Line((-24.02205, -72.16775), (24.02205, -72.16775))
            ThreePointArc((24.02205, -72.16775), (32.9125035599, -68.4852035599), (36.59505, -59.59475))
        make_face()
        with BuildLine():
            ThreePointArc((-33.54705, 59.59475), (-30.7572420908, 66.3299420908), (-24.02205, 69.11975))
            Line((-24.02205, 69.11975), (24.02205, 69.11975))
            ThreePointArc((24.02205, 69.11975), (30.7572420908, 66.3299420908), (33.54705, 59.59475))
            Line((33.54705, 59.59475), (33.54705, -59.59475))
            ThreePointArc((33.54705, -59.59475), (30.7572420908, -66.3299420908), (24.02205, -69.11975))
            Line((24.02205, -69.11975), (-24.02205, -69.11975))
            ThreePointArc((-24.02205, -69.11975), (-30.7572420908, -66.3299420908), (-33.54705, -59.59475))
            Line((-33.54705, -59.59475), (-33.54705, 59.59475))
        make_face(mode=Mode.SUBTRACT)
    extrude(amount=F11_DEPTH)

    # F12: cut F3, F7, F1
    add(f3.part, mode=Mode.SUBTRACT)
    add(f7.part, mode=Mode.SUBTRACT)
    add(f1.part, mode=Mode.SUBTRACT)

    # F13
    f13_edges = [f8.edges().sort_by_distance(p)[0] for p in [
        (-49.007942, -10.333779, -3.175),
        (-45.325396, -78.818982, -3.175),
        (-49.007942, -10.333779, 10.8839),
        (-12.412892, 55.737971, -3.175),
        (24.182158, -10.333779, 10.8839),
        (24.182158, -10.333779, -3.175),
        (20.499612, -78.818982, 10.8839),
        (20.499612, -78.818982, -3.175),
        (20.499612, 58.151425, 10.8839),
        (-12.412892, 61.833971, 10.8839),
        (-45.325396, 58.151425, 10.8839),
        (-45.325396, -78.818982, 10.8839),
        (-12.412892, -82.501529, 10.8839),
        (-41.014873, 53.840902, -3.175),
        (16.189089, 53.840902, -3.175),
        (18.086158, -10.333779, -3.175),
        (16.189089, -74.508459, -3.175),
        (-12.412892, -76.405529, -3.175),
        (-41.014873, -74.508459, -3.175),
        (-42.911942, -10.333779, -3.175),
        (20.499612, 58.151425, -3.175),
        (-12.412892, 61.833971, -3.175),
        (-45.325396, 58.151425, -3.175),
        (-12.412892, -82.501529, -3.175),
    ]]
    fillet(f13_edges, radius=F13_R)


solid = f8.part
